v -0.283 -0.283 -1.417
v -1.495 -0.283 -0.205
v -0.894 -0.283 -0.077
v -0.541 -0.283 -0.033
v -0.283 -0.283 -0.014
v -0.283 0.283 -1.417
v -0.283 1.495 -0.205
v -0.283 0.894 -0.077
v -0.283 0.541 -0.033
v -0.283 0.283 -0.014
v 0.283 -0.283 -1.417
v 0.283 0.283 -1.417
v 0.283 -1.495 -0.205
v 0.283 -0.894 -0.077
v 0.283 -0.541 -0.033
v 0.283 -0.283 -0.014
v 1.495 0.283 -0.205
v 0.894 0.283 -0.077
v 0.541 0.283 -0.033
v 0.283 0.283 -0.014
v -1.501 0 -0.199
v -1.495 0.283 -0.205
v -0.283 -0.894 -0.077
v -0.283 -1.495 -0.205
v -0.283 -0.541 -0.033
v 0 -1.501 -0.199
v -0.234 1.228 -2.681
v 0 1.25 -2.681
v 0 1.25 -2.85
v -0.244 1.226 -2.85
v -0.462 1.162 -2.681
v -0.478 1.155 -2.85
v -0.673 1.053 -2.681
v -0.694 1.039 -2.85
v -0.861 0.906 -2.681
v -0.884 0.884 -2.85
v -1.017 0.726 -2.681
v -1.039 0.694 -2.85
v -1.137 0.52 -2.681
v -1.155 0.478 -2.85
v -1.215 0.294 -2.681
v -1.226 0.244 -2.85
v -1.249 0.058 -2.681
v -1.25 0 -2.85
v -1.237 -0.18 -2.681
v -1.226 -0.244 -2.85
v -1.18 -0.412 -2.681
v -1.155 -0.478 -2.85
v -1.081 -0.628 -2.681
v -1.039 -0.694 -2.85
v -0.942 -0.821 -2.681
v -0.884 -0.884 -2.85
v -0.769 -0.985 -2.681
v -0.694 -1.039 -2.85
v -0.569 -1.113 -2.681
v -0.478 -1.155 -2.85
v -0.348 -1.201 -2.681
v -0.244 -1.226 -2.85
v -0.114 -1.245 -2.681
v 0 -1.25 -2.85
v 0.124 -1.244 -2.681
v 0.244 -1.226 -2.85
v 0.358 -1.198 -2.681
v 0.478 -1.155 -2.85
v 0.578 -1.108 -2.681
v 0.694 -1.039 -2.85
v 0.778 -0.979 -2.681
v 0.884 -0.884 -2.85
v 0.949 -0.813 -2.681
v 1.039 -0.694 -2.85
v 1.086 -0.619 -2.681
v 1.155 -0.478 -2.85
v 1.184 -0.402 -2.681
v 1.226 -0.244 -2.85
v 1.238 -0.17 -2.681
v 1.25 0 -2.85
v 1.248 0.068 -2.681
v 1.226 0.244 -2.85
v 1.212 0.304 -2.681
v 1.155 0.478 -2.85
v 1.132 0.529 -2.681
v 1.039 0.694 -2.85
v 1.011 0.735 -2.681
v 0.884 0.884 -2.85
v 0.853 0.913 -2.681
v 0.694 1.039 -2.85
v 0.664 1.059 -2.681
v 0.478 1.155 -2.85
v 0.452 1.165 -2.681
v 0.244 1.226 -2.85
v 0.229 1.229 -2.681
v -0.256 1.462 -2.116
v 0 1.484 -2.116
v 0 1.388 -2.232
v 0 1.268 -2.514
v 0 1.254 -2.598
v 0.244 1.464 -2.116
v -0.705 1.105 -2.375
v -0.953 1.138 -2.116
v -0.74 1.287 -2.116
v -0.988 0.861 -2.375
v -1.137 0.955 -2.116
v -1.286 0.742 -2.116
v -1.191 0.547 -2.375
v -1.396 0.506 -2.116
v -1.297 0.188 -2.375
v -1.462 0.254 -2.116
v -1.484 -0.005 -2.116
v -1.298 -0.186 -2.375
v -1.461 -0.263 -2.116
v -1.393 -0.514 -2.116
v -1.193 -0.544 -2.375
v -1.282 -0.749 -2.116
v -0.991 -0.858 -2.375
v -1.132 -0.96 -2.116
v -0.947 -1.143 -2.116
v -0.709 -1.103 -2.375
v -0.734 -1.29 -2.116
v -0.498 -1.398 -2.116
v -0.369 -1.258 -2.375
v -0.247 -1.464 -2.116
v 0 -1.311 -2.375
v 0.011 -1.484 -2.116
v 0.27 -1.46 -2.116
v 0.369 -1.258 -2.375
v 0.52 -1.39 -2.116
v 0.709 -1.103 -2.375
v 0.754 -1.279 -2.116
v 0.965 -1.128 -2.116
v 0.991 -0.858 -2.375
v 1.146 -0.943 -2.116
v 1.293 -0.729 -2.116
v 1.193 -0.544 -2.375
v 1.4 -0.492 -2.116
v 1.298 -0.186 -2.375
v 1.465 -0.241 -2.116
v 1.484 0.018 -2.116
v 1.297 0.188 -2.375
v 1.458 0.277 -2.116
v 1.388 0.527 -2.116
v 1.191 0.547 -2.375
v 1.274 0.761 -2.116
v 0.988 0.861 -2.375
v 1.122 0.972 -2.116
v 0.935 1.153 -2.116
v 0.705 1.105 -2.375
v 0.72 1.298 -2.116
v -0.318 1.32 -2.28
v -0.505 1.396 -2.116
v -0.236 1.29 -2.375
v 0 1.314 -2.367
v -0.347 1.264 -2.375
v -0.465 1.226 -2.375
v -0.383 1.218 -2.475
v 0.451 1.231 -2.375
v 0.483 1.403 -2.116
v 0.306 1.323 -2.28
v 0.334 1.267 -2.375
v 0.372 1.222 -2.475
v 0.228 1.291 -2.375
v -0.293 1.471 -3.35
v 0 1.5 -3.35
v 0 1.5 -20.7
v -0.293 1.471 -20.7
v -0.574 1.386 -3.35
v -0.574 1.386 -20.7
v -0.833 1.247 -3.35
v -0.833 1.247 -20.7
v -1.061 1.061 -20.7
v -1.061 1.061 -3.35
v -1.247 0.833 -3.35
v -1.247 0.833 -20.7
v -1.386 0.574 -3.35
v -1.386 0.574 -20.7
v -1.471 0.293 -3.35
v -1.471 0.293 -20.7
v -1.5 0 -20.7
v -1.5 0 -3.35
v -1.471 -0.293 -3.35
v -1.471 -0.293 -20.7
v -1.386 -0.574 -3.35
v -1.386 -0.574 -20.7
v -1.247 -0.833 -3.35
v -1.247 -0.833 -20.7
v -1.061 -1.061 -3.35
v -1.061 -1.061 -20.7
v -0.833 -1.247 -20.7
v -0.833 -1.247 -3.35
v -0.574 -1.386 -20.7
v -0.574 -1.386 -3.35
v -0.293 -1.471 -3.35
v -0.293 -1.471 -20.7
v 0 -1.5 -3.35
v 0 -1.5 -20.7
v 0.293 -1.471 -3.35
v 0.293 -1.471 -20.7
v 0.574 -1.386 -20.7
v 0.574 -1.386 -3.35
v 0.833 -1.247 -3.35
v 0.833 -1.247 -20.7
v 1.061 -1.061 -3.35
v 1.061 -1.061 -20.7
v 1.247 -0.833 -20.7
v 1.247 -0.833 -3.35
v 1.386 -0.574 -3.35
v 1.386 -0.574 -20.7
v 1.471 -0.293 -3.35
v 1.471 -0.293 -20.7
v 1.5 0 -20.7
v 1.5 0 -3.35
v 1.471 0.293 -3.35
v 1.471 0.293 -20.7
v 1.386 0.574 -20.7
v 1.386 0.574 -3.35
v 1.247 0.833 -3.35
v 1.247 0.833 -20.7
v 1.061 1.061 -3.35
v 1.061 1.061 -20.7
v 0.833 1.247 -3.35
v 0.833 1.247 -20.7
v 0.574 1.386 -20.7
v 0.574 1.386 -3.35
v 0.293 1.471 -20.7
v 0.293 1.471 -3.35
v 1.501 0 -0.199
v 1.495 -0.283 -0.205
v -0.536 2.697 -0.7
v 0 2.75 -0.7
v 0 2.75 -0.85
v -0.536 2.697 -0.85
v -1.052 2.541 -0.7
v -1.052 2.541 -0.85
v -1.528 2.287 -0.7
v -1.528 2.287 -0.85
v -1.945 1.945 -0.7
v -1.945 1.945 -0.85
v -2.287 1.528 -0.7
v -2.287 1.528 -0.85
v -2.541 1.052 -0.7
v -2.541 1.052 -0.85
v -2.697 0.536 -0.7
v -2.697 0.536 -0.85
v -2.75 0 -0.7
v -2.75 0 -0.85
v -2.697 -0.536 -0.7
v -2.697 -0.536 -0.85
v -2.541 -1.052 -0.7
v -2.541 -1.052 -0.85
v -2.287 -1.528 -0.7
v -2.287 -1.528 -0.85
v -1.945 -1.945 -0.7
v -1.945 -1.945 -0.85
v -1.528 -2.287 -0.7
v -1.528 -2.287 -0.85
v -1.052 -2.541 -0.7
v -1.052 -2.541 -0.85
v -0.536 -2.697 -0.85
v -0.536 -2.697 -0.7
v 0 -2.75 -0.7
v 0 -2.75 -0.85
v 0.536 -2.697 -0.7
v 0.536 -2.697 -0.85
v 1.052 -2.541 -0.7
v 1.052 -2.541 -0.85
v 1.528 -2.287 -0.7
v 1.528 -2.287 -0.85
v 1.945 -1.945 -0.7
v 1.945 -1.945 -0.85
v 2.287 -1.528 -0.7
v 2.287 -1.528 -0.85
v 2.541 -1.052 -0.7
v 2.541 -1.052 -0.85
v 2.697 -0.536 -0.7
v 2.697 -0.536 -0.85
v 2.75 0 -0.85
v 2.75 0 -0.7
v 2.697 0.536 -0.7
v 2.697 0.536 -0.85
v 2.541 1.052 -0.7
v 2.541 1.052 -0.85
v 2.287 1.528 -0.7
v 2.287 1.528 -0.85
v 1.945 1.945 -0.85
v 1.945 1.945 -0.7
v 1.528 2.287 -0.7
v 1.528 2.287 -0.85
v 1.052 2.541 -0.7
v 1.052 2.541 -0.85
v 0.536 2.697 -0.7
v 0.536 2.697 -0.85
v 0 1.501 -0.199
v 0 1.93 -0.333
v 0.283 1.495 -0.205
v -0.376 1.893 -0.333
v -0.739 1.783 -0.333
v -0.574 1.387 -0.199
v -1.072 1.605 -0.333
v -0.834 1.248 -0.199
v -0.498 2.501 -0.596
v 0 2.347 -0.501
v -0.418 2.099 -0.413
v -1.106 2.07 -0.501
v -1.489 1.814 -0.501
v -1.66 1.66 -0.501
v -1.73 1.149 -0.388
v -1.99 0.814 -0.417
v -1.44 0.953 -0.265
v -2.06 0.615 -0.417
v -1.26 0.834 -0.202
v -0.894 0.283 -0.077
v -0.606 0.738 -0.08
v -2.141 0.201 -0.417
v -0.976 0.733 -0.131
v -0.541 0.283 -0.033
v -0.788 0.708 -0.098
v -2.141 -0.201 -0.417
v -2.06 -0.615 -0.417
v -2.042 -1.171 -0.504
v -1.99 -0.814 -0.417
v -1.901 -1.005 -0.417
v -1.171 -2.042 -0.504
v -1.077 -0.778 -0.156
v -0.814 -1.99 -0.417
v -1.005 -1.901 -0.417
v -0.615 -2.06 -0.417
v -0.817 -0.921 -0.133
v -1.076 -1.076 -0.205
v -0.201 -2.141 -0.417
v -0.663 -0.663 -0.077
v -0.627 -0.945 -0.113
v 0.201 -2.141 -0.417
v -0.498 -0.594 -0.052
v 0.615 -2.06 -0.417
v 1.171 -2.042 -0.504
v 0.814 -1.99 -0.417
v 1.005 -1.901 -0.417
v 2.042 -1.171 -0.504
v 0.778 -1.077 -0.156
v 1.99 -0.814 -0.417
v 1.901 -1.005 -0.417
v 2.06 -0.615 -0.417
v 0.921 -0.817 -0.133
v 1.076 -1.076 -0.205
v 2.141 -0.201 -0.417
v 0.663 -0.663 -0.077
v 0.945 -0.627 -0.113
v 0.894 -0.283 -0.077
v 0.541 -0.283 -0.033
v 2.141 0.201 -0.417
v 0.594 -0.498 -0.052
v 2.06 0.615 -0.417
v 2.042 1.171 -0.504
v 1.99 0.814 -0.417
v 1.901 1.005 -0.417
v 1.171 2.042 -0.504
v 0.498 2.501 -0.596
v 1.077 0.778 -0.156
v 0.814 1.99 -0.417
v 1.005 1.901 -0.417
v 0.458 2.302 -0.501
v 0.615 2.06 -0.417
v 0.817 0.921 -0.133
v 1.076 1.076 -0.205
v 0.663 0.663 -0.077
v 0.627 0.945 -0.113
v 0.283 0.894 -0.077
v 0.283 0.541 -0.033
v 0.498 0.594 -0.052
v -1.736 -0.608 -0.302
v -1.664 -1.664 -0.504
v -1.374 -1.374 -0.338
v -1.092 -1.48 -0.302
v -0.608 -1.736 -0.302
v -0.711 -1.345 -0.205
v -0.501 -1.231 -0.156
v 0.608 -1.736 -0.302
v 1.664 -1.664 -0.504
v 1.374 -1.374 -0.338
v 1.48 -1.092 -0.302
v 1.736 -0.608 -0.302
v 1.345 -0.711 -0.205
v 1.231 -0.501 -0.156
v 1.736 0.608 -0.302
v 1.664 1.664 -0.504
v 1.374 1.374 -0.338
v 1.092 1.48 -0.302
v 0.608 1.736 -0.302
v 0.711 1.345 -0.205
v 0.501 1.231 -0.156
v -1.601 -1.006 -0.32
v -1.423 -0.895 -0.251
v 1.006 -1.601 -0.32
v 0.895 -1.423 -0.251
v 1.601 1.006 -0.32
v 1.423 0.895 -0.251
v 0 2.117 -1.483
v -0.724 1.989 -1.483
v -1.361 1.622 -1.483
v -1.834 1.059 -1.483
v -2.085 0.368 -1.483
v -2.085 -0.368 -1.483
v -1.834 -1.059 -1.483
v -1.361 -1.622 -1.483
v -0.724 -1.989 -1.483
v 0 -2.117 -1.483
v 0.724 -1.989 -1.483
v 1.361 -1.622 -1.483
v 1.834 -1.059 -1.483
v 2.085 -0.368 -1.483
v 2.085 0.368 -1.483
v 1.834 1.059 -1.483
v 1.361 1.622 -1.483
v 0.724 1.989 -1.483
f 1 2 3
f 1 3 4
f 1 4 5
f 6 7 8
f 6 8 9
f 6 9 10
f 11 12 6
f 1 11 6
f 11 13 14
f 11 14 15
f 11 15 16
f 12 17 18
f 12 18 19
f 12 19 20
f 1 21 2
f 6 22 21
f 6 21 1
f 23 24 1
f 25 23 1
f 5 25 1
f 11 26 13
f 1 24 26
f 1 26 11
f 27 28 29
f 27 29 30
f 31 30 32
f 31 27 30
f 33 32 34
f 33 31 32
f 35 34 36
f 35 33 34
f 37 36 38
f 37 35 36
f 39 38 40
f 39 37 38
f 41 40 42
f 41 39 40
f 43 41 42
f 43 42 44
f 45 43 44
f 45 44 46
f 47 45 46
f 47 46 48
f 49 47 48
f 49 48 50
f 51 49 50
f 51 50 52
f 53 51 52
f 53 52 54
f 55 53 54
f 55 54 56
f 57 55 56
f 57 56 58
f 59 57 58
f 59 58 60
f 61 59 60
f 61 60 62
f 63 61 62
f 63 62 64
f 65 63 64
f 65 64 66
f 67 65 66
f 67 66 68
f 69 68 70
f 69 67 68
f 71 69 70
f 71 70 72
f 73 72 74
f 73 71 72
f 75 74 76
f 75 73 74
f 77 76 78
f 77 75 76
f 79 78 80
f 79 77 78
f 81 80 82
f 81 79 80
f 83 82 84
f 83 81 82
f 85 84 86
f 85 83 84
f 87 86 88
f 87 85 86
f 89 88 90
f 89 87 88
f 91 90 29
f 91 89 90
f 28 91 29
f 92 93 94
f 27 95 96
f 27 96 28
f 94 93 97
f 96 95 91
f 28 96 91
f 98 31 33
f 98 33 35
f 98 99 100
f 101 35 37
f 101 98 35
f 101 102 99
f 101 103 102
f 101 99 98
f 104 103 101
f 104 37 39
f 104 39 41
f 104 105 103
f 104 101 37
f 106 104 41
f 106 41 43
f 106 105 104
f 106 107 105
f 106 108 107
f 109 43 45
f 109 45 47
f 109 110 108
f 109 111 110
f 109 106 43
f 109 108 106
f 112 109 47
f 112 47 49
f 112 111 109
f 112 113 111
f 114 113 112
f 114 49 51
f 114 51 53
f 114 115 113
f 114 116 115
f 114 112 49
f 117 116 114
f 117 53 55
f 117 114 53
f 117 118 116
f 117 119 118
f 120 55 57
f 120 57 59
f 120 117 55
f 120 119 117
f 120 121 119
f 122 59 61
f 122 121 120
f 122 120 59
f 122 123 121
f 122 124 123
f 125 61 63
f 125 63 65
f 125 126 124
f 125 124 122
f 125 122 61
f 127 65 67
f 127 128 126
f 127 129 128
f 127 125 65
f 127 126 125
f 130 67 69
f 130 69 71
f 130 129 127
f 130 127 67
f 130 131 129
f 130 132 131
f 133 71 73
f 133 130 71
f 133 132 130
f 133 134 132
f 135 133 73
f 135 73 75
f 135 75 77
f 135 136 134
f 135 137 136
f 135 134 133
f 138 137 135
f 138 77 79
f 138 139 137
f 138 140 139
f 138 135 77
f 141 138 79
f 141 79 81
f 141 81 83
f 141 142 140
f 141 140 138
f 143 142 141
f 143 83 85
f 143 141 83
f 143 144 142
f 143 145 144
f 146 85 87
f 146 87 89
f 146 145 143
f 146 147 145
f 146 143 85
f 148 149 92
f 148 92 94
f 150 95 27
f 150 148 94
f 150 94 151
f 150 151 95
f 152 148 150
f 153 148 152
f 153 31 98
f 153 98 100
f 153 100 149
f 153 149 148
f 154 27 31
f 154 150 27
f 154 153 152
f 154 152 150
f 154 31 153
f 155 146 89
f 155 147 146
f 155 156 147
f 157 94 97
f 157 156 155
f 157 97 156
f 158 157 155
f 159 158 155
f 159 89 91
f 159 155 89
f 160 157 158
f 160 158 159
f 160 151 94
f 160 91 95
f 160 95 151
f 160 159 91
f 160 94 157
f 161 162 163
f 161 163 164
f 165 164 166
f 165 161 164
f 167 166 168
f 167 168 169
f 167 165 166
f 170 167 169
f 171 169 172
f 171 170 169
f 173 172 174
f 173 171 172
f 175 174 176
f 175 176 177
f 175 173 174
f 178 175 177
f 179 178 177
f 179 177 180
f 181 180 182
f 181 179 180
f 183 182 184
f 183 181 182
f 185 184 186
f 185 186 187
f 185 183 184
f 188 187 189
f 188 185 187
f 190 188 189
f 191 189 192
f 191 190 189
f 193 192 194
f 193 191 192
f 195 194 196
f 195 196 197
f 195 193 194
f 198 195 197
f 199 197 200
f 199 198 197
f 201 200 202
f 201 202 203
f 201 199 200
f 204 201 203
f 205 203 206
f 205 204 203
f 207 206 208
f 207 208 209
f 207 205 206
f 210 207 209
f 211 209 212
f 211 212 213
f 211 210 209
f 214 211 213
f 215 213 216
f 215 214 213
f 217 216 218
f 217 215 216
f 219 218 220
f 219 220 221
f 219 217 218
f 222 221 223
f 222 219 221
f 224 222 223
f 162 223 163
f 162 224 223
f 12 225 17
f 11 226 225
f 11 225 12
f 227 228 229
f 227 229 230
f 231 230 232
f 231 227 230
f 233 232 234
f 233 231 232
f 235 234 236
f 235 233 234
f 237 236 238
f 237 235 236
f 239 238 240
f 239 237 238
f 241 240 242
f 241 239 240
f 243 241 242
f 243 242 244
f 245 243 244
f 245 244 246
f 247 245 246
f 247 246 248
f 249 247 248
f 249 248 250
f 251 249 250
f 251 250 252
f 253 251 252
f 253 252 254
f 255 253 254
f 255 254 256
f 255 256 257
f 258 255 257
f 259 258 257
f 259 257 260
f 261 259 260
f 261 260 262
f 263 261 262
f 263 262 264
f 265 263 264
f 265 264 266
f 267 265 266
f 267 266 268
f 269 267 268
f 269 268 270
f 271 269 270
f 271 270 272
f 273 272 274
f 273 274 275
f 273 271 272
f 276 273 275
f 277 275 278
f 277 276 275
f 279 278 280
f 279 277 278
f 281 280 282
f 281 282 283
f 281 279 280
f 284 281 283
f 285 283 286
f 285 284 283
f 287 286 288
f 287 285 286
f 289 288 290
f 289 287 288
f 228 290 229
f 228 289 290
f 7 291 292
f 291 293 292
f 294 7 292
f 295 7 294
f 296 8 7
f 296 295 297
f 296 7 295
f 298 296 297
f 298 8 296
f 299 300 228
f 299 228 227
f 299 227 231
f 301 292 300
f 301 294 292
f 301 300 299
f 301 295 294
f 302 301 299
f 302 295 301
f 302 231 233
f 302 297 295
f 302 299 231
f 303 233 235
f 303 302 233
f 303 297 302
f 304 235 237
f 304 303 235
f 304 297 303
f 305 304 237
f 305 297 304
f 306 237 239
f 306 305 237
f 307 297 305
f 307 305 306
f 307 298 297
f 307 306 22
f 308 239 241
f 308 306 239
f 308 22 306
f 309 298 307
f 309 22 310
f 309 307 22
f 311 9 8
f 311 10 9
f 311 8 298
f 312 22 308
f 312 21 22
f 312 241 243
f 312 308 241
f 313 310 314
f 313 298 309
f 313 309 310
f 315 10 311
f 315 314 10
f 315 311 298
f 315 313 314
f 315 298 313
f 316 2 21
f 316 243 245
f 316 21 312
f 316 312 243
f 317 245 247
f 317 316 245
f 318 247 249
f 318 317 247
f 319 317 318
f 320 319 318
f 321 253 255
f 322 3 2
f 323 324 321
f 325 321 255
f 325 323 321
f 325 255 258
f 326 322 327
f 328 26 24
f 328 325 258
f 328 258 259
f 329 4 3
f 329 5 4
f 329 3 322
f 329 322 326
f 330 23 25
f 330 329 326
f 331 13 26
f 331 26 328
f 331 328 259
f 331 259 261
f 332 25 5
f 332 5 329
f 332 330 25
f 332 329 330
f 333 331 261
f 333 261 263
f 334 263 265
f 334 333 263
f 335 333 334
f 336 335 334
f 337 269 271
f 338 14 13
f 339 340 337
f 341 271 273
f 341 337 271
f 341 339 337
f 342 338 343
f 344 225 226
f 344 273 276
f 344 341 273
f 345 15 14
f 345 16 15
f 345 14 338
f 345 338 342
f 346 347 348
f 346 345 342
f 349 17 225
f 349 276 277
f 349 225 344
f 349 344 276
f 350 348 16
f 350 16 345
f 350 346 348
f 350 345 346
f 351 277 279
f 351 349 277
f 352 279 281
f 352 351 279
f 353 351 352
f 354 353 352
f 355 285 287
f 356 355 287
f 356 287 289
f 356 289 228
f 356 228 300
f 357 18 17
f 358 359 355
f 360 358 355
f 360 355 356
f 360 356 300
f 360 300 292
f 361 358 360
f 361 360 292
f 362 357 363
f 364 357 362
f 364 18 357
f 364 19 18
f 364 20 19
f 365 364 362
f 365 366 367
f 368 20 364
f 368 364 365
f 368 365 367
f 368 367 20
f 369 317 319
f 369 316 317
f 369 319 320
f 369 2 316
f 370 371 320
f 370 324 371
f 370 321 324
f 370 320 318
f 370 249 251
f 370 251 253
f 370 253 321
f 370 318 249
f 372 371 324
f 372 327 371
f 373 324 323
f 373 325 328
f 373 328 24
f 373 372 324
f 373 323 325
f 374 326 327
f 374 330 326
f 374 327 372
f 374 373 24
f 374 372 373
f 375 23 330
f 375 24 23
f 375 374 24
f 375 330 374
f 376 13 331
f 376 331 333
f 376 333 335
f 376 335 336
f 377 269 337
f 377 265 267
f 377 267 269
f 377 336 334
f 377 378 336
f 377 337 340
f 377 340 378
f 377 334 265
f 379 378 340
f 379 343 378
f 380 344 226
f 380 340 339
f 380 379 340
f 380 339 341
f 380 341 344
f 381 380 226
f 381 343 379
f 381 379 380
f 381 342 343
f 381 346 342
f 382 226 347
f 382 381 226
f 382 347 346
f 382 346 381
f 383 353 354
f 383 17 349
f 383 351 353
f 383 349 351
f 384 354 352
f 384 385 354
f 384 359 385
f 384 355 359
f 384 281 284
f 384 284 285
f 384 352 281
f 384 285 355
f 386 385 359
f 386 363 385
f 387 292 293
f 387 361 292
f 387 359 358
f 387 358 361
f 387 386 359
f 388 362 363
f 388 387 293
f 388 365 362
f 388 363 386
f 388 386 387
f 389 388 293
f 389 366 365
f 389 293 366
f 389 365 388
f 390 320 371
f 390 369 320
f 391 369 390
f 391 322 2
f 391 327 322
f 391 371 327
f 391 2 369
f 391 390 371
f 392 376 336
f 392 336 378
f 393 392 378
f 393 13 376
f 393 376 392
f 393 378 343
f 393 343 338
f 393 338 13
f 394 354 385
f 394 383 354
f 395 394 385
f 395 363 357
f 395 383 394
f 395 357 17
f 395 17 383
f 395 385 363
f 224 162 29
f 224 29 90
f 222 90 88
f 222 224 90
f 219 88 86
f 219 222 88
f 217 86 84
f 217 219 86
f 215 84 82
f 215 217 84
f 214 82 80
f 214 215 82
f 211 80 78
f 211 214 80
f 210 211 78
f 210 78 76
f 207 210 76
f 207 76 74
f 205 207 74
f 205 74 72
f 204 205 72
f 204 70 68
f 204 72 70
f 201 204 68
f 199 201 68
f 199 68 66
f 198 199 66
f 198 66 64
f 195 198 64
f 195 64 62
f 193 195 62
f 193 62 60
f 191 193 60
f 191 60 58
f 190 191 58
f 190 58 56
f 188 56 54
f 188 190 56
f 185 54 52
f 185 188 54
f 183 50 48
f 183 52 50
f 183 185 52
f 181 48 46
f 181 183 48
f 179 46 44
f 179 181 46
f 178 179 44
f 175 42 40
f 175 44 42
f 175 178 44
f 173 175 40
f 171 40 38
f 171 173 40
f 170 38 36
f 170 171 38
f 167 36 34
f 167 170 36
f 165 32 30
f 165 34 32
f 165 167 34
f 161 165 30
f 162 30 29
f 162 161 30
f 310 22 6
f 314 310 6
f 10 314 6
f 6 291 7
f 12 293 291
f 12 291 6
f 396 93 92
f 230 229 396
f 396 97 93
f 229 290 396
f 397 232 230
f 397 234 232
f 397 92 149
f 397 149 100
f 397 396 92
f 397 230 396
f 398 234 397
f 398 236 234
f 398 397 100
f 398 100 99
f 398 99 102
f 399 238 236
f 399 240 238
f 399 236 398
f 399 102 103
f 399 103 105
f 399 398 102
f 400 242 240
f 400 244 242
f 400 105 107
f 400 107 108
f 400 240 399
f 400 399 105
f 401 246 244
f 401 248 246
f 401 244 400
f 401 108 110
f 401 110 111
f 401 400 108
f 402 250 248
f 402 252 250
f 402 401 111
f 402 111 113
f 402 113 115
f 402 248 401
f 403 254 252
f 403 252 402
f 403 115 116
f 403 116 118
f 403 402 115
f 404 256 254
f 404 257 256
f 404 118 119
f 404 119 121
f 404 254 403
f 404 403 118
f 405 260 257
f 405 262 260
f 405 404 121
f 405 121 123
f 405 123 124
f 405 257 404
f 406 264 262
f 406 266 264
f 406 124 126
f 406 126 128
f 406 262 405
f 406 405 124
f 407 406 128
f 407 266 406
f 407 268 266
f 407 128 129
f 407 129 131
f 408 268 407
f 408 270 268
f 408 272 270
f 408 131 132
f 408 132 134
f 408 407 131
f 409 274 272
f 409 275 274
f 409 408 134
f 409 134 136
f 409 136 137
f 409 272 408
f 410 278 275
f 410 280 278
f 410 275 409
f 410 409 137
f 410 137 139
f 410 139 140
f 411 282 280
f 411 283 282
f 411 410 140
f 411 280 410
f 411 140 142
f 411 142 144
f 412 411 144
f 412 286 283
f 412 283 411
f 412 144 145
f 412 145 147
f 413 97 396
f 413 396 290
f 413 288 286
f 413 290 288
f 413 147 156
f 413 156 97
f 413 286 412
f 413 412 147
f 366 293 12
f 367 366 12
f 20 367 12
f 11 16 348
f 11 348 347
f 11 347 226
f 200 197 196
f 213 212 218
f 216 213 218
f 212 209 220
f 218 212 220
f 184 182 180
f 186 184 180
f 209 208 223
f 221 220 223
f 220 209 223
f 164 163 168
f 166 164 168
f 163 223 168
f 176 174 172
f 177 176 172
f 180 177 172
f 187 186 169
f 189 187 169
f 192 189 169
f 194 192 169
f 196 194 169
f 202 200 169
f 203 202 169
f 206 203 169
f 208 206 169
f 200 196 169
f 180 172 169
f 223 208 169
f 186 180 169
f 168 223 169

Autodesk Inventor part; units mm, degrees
ref_plane "WorkPlane2" through (0, 0, 0) normal (0, 0, 1) x (1, 0, 0)
sketch "Sketch1" plane through (0, 0, 0) normal (1, 0, 0) x (0, 1, 0)
  point P0 (0, 0)
ref_plane "Work Plane2" through (0, 0, -2.35) normal (0, 0, 1) x (1, 0, 0)
ref_plane "WorkPlane3" through (0, 0, 7) normal (0, 0, 1) x (1, 0, 0)
sketch "Sketch2" plane through (0, 0, 0) normal (0, 1, 0) x (-1, 0, 0)
  point P0 (0, 0)
sketch "Sketch3" plane through (0, 0, 0) normal (1, 0, 0) x (0, 1, 0)
  line L0 (1.5, -3.35) -> (1.25, -2.85)
  line L1 (1.5, -20.7) -> (1.5, -3.35)
  line L2 (0, -20.7) -> (1.5, -20.7)
  line L3 (0, 0) -> (0, -20.7)
  arc A0 (2.75, -0.7) -> (0, 0) centre (0, -5.7518) ccw
  line L4 (2.75, -0.85) -> (2.75, -0.7)
  line L5 (1.25, -2.35) -> (2.75, -0.85)
  line L6 (1.25, -2.85) -> (1.25, -2.35)
  line L7 (0, -31.6445) -> (0, 31.6445) construction
  line L8 (0, -31.6445) -> (0, 31.6445)
  line L9 (0, -44.3023) -> (0, 44.3023) projected
  dimension "d2" = 1.5
  dimension "d4" = 1.25
  dimension "d6" = 0.5
  dimension "d8" = 1.65
  dimension "d10" = 135
  dimension "d12" = 2.75
  dimension "d14" = 0
  dimension "d16" = 0.7
  dimension "d18" = 20
  dimension "d22" = 17.35
revolve "Revolution1" add sketch "Sketch3" angle 360 about axis through (0, 0, -31.6445) along (0, 0, 1)
fillet "Fillet1" radius 0.8 1 edges at (0, -1.25, -2.35)
sketch "Sketch4" plane through (0, 0, 0) normal (0, 1, 0) x (-1, 0, 0)
  line L0 (0, 0) -> (-1.7, 0)
  line L1 (0, -1.4167) -> (0, 0)
  line L2 (-1.7, 0) -> (-0.2833, -1.4167)
  line L3 (0, -6.9021) -> (0, 1.1504) projected
  arc A0 (2.75, -0.7) -> (-2.75, -0.7) centre (0, -5.7518) ccw projected
  line L4 (0, -1.4167) -> (-0.2833, -1.4167)
  point P0 (0, -1.7)
  dimension "d30" = 45
  dimension "d33" = 3.4
  dimension "d34" = 0.2833
  dimension "d35" = 90
extrude "Extrusion1" cut sketch "Sketch4" along normal mid plane 0.5667
pattern_circular "PolarArray1" count 4 over 360 about axis through (0, 0, -10) along (0, 0, 1) of "Extrusion1"
thread "Thread1" size "M3x0.5" class "6g" standard "ISO Metric profile" full length
ref_plane "MSC_PF1" through (0, 0, 0) normal (1, 0, 0) x (0, 1, 0)
ref_plane "MSC_PT1" through (0, 2.75, -0.85) normal (0, 0, -1) x (-1, 0, 0)
equation "\"d2\" = 0.5 * NND"
equation "\"d4\" = 0.5 * msp_mdtds"
equation "\"d6\" = msp_x"
equation "\"d8\" = ParK"
equation "\"d12\" = 0.5 * Dk"
equation "\"d16\" = ParF"
equation "\"d18\" = NLG"
equation "\"d22\" = b"
equation "\"d24\" = r"
equation "\"d33\" = M"
equation "\"d34\" = 0.0833333 * M"
equation "\"d31\" = 0.166667 * M"
equation "\"d39\" = b"
equation "\"PTC\" = 0.5"
equation "\"msp_x\" = PTC"
equation "\"NLG\" = 20"
equation "\"NND\" = 3"
equation "\"ParK\" = 1.65"
equation "\"r\" = 0.8"
equation "\"msp_mdtds\" = NND - PTC"
equation "\"b\" = 17.35"
equation "\"Dk\" = 5.5"
equation "\"ParF\" = 0.7"
equation "\"M\" = 3.4"
equation "\"ParA\" = 1"
equation "\"THREADDIA\" = NND"
equation "\"TEMPLATE\" = 1.2345"
properties part number "ISO 7047 - M3x20 - 4.8 - H" material "Steel"
